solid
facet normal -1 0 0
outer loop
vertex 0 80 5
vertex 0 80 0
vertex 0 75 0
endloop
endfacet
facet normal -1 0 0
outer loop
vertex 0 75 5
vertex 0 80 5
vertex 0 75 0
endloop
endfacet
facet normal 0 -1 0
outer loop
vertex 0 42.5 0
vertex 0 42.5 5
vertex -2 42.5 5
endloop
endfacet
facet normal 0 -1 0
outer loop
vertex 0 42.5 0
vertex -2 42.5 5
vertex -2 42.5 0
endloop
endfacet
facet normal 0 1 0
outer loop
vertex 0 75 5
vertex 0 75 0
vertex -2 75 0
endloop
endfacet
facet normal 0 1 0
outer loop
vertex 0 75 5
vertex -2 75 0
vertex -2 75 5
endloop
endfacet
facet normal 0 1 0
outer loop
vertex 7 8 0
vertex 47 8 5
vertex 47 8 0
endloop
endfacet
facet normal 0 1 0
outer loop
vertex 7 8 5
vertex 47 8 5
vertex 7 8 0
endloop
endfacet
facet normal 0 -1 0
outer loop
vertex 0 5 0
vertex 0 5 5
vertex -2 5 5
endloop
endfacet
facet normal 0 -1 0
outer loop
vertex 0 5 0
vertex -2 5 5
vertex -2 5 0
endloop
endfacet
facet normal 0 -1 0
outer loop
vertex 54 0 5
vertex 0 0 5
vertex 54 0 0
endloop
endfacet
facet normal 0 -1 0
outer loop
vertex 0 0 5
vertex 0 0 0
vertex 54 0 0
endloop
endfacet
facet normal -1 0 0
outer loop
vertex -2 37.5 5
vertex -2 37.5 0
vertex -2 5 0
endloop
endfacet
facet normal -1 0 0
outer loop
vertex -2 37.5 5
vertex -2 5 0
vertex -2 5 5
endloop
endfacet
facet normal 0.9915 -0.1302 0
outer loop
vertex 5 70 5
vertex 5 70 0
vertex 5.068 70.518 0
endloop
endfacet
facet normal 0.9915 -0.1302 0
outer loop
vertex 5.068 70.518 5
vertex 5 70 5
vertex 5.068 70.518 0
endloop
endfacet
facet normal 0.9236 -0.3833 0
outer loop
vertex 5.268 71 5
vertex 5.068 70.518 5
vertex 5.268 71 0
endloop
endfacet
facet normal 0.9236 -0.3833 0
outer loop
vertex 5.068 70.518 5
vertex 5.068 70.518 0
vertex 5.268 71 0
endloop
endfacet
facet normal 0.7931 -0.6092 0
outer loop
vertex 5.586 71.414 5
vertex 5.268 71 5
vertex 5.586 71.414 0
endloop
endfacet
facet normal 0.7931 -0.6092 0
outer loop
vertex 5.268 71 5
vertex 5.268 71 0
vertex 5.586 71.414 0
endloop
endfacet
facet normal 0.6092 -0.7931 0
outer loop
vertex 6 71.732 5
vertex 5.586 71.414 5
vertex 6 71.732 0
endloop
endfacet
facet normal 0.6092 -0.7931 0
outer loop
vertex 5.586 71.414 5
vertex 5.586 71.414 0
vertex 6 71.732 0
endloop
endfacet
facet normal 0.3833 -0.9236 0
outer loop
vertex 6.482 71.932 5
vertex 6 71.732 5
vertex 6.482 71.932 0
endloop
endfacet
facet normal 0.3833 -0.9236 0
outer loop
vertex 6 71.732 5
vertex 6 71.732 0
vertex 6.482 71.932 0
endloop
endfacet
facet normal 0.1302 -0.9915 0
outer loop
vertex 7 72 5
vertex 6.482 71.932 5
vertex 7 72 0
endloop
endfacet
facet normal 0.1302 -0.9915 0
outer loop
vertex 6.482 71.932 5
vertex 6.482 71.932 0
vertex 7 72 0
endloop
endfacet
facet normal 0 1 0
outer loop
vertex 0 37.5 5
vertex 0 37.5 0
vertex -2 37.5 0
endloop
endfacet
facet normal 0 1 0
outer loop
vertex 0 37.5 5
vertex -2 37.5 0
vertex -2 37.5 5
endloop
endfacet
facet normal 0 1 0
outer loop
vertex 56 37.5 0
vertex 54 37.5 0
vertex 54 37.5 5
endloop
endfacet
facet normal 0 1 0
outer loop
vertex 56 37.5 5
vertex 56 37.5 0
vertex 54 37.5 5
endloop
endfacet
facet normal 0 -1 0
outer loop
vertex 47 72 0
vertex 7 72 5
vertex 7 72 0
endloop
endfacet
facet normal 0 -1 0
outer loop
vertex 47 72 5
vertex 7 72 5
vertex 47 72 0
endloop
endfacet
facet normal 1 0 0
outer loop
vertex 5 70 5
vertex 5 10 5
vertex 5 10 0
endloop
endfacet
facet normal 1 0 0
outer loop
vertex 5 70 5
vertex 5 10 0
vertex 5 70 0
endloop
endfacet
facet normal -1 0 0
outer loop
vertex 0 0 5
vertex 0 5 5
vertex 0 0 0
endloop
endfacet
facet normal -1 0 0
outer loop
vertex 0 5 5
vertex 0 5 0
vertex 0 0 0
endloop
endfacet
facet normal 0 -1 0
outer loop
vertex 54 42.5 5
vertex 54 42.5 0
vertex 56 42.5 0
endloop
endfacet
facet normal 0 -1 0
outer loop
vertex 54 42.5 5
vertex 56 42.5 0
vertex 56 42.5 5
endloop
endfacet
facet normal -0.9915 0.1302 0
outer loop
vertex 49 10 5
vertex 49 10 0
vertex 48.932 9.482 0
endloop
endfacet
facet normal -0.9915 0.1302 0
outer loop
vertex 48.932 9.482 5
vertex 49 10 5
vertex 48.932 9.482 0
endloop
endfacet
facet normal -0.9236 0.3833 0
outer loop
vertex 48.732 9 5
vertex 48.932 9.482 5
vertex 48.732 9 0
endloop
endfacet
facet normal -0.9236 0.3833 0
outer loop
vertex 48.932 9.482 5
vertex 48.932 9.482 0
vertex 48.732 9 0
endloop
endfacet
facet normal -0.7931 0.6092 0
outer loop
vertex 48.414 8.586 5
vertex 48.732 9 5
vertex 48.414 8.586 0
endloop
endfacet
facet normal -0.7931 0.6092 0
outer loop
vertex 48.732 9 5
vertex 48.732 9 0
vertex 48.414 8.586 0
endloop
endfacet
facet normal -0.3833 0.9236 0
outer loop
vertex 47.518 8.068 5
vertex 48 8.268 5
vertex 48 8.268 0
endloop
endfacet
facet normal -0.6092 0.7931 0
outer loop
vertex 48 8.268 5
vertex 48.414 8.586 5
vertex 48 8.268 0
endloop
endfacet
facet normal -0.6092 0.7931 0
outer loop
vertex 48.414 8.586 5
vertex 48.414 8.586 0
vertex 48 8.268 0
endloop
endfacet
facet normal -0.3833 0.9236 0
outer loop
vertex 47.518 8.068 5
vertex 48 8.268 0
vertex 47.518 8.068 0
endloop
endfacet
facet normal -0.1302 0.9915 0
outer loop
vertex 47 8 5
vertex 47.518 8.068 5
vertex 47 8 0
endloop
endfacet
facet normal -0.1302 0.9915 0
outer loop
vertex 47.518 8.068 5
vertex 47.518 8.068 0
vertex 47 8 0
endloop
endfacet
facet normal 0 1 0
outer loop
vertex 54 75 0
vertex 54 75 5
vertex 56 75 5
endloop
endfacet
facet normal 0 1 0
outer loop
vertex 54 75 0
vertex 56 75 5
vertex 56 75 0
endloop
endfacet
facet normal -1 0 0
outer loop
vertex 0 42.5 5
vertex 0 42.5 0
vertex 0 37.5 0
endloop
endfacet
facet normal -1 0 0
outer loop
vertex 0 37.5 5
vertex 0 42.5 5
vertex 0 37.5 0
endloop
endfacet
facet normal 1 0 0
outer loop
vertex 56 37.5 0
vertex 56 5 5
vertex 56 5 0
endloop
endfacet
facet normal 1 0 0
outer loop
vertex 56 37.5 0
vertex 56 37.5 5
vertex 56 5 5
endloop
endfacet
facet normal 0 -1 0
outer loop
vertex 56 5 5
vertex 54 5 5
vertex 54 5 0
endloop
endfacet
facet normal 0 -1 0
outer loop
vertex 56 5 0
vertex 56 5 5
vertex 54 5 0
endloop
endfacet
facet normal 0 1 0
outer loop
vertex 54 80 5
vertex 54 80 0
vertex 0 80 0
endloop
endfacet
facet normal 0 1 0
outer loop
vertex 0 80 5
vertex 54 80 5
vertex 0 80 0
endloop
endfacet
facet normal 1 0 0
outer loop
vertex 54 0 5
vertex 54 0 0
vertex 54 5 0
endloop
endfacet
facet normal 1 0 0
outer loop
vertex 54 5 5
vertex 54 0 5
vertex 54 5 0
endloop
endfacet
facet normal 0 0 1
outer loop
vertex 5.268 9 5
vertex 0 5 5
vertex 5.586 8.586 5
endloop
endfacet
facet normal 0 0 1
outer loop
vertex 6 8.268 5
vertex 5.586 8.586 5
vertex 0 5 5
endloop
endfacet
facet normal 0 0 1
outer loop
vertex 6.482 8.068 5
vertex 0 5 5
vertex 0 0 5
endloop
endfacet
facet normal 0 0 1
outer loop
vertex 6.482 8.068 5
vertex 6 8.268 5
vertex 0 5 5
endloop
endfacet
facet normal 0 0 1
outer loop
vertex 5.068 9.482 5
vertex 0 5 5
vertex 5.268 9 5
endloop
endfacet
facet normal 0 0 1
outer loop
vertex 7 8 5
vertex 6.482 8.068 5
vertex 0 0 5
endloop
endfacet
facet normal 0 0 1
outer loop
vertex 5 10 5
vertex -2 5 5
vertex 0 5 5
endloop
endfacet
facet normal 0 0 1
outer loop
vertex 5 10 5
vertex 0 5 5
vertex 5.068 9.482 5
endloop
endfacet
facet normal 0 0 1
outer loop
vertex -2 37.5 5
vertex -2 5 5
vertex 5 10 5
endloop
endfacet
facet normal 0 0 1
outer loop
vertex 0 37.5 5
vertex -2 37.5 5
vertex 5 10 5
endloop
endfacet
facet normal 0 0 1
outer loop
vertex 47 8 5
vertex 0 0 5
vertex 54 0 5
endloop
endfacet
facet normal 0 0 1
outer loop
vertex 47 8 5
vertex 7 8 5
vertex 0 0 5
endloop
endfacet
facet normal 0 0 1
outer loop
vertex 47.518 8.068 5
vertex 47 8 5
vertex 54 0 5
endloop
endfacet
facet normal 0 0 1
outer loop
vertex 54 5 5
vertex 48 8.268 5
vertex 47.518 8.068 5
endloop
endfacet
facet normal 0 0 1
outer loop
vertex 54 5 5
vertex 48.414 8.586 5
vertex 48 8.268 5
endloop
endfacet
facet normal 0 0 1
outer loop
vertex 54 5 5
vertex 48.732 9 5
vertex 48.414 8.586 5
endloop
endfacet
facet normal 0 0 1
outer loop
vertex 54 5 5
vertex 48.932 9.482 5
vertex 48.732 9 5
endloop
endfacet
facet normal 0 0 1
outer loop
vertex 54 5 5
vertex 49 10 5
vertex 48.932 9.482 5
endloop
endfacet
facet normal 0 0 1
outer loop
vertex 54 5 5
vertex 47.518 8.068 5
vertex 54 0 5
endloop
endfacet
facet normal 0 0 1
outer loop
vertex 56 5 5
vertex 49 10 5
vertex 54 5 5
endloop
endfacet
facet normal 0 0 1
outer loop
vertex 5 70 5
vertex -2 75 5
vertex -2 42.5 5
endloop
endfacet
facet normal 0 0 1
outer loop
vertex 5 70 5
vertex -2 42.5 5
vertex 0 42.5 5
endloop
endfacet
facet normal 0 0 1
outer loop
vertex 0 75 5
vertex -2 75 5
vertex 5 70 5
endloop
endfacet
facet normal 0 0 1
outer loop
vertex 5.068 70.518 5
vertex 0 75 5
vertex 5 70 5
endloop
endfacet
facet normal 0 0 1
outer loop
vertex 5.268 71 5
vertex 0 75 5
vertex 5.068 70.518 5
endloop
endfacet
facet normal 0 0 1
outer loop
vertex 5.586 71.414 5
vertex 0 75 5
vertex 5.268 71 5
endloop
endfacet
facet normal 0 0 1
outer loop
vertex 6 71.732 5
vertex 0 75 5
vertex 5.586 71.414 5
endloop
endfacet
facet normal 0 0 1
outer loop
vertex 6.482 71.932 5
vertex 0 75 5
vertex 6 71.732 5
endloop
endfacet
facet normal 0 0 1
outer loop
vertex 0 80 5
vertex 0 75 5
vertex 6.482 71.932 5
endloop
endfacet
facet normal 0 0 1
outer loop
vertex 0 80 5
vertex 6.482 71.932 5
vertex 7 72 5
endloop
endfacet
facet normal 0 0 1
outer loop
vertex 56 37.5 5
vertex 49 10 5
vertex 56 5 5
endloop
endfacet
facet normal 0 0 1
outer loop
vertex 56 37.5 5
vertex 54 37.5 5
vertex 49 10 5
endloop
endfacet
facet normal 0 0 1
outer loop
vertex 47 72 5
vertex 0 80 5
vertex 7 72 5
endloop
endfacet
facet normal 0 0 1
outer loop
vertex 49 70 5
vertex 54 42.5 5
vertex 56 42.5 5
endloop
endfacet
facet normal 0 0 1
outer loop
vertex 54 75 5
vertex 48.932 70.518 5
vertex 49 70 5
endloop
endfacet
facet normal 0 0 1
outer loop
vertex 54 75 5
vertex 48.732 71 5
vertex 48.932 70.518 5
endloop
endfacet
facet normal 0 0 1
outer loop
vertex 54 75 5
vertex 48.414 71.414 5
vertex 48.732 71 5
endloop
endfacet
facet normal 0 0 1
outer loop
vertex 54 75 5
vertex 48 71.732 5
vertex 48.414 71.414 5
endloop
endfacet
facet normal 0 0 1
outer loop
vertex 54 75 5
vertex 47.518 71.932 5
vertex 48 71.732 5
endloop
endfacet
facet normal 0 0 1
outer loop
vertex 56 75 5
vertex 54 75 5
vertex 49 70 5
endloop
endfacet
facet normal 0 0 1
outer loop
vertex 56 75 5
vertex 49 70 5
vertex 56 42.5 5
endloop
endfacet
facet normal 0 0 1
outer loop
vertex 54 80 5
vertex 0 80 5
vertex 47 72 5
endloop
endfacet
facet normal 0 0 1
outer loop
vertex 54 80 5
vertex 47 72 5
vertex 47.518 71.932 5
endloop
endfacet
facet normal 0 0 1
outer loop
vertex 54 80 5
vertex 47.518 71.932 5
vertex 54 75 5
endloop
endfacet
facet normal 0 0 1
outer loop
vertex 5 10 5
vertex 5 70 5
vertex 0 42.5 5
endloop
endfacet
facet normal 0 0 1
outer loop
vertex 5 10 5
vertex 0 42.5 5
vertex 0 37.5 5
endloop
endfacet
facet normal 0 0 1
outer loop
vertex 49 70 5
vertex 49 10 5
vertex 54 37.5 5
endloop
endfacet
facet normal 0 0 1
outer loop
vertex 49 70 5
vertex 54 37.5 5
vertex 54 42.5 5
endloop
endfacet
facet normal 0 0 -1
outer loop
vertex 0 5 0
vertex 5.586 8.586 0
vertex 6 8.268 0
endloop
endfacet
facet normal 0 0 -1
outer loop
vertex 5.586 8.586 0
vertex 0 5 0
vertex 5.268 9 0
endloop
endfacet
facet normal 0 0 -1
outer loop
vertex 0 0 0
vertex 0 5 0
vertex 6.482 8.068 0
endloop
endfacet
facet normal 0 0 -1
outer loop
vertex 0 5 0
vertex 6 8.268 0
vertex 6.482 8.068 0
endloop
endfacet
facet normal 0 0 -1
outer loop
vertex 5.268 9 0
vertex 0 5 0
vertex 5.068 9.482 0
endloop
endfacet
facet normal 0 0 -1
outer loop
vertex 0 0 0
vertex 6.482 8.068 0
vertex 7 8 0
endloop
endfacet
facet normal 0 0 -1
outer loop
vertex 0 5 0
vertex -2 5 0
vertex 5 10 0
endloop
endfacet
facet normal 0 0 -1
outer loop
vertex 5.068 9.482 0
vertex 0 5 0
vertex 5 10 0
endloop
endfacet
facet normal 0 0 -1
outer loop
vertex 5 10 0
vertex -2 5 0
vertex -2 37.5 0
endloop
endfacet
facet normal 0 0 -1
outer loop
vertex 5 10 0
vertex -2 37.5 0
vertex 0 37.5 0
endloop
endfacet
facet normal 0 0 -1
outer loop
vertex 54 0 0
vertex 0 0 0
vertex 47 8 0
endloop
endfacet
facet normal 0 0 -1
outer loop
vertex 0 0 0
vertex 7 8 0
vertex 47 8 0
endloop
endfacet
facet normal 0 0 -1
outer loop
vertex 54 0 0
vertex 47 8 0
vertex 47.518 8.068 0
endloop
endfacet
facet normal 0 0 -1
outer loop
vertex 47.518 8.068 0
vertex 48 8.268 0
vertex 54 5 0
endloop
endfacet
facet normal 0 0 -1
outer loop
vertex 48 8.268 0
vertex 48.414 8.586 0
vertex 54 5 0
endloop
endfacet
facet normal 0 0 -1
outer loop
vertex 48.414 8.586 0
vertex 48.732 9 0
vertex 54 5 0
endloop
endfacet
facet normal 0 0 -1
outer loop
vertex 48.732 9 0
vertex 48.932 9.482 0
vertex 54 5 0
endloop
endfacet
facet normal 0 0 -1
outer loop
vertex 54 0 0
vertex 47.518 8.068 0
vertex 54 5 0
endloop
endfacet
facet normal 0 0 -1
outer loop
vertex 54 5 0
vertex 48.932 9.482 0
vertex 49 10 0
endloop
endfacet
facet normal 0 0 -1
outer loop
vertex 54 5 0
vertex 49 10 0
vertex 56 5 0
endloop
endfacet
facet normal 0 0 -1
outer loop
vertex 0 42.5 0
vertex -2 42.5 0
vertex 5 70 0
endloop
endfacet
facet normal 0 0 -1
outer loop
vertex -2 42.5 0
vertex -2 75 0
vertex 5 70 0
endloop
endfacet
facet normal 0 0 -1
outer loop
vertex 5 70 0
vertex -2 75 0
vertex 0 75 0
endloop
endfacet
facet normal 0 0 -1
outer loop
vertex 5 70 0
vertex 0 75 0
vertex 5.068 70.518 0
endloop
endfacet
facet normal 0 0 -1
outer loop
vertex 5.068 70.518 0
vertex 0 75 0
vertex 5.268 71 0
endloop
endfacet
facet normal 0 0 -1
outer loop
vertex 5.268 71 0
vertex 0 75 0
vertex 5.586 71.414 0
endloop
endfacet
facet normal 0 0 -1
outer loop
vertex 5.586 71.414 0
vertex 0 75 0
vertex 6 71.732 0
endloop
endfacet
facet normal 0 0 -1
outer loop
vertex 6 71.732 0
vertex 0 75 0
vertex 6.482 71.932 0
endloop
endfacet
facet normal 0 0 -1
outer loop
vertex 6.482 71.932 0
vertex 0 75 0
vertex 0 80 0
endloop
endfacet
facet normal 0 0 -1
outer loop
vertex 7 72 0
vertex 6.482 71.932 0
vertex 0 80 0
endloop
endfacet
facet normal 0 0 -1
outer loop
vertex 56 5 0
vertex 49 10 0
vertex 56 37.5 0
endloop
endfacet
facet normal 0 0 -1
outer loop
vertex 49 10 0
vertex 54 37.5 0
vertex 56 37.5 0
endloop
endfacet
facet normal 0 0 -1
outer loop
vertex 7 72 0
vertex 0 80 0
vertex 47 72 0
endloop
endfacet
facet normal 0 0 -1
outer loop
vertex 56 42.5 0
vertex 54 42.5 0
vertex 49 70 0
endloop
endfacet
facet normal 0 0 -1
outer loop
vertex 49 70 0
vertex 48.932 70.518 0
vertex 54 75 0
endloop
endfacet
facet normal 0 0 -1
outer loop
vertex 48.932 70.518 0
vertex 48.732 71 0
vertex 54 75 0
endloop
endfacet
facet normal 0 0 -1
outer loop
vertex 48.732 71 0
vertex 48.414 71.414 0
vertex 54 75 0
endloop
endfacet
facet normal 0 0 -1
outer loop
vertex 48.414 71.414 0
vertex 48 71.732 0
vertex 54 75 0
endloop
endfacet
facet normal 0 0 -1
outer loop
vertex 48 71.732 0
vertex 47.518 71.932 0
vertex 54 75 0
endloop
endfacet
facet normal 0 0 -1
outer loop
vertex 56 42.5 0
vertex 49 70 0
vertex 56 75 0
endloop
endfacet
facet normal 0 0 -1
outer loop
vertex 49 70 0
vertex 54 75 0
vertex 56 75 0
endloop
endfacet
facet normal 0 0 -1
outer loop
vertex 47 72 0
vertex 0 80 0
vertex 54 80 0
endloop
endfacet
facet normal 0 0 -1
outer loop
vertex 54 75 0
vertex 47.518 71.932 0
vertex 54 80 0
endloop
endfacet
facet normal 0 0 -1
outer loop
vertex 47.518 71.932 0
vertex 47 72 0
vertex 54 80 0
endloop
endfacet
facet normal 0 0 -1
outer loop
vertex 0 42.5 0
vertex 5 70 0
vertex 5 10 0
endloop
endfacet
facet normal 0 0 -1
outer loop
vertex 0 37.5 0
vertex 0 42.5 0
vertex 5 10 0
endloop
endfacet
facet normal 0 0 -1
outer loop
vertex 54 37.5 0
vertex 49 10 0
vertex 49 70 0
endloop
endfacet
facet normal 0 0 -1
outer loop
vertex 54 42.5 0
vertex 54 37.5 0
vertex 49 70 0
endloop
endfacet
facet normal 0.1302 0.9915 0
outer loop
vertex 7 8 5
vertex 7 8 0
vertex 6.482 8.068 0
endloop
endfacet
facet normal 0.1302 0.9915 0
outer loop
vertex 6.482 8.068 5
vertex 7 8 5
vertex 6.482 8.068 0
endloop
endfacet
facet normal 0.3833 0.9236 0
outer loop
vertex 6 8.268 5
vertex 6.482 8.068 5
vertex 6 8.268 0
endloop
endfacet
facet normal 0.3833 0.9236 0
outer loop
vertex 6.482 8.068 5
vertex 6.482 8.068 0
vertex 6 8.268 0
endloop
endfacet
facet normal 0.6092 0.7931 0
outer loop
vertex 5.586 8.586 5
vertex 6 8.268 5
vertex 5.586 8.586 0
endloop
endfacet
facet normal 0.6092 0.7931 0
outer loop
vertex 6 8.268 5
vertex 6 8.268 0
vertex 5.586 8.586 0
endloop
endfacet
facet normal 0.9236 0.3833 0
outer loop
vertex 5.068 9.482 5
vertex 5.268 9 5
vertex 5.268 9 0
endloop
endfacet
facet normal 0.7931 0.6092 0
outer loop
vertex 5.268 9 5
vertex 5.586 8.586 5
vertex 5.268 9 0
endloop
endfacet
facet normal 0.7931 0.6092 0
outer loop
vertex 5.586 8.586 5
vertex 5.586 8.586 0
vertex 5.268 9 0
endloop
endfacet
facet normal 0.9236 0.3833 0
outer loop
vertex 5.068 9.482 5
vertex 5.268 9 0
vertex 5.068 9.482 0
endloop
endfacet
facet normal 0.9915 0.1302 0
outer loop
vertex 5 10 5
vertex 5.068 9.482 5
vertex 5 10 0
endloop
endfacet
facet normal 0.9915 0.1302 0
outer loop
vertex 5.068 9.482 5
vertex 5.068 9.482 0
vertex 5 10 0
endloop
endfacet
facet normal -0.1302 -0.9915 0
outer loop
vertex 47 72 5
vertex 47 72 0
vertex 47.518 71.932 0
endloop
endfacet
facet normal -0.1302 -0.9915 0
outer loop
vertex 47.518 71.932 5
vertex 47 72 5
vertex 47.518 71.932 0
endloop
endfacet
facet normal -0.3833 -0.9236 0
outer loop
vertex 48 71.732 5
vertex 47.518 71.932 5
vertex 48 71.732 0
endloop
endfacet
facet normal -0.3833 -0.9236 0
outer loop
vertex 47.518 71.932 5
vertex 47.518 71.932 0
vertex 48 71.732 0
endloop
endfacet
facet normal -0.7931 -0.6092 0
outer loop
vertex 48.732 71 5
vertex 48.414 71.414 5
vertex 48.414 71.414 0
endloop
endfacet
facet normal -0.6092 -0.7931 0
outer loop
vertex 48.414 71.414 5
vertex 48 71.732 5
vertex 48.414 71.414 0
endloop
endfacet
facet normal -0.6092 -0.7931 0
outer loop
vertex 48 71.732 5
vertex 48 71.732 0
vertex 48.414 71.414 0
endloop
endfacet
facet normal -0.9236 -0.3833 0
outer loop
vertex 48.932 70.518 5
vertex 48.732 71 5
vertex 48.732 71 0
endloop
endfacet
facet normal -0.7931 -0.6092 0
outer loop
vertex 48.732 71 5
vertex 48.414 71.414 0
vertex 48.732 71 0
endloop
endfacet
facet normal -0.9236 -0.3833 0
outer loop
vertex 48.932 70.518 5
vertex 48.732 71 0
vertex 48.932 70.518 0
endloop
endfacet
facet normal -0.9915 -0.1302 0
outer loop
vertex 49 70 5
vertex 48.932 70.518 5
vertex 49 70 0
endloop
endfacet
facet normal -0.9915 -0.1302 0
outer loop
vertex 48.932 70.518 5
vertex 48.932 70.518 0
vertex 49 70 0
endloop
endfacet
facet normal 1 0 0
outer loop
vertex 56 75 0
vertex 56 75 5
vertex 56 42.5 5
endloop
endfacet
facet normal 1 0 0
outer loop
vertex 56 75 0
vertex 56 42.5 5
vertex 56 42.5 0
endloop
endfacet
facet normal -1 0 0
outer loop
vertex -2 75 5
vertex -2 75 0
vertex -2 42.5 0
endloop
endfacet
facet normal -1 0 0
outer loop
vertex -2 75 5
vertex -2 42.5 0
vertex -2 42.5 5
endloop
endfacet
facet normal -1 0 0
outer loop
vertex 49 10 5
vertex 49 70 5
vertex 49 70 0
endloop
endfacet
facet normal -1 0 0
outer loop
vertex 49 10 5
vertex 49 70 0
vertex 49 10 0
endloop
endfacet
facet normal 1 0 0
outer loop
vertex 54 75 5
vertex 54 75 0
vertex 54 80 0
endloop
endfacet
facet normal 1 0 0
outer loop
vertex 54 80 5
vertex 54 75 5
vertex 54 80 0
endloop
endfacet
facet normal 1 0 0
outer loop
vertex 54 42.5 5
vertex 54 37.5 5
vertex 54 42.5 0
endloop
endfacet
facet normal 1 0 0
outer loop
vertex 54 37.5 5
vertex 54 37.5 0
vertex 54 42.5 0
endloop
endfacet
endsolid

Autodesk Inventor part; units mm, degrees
ref_plane "YZ Plane" through (0, 0, 0) normal (1, 0, 0) x (0, 1, 0)
ref_plane "XZ Plane" through (0, 0, 0) normal (0, 1, 0) x (-1, 0, 0)
ref_plane "XY Plane" through (0, 0, 0) normal (0, 0, 1) x (1, 0, 0)
sketch "スケッチ1" plane through (0, 0, 0) normal (0, 0, 1) x (1, 0, 0)
  line L0 (0, 0) -> (54, 0)
  line L1 (54, 0) -> (54, 80)
  line L2 (54, 80) -> (0, 80)
  line L3 (0, 80) -> (0, 0)
  dimension "d0" = 54
  dimension "d1" = 80
extrude "押し出し1" add sketch "スケッチ1" along normal blind 5
sketch "スケッチ2" plane through (54, 0, 0) normal (1, 0, 0) x (0, 0, -1)
  line L0 (0, 0) -> (0, 80) projected
  line L1 (0, 80) -> (-5, 80) projected
  line L2 (-5, 0) -> (-5, 80) projected
  line L3 (0, 0) -> (-5, 0) projected
  line L4 (-5, 0) -> (-5, 80) projected
  line L5 (-5, 40) -> (0, 40) construction
  line L6 (0, 0) -> (0, 80) projected
  line L7 (-5, 75) -> (0, 75)
  line L8 (0, 75) -> (0, 42.5)
  line L9 (0, 42.5) -> (-5, 42.5)
  line L10 (-5, 42.5) -> (-5, 75)
  line L11 (-5, 5) -> (0, 5)
  line L12 (0, 5) -> (0, 37.5)
  line L13 (0, 37.5) -> (-5, 37.5)
  line L14 (-5, 37.5) -> (-5, 5)
  point P0 (0, 37.5)
  point P1 (-5, 37.5)
  point P2 (0, 5)
  point P3 (-5, 42.5)
  point P4 (0, 42.5)
  point P5 (0, 75)
  dimension "d4" = 5
  dimension "d5" = 5
extrude "押し出し2" add sketch "スケッチ2" along normal blind 2 contours L11 L2 L13 L0 | L9 L2 L7 L0
sketch "スケッチ3" plane through (0, 0, 0) normal (-1, 0, 0) x (0, 0, 1)
  line L0 (0, 42.5) -> (0, 75) projected
  line L1 (0, 75) -> (5, 75) projected
  line L2 (5, 75) -> (5, 42.5) projected
  line L3 (5, 42.5) -> (0, 42.5) projected
  line L4 (5, 37.5) -> (5, 5) projected
  line L5 (5, 5) -> (0, 5) projected
  line L6 (0, 5) -> (0, 37.5) projected
  line L7 (0, 37.5) -> (5, 37.5) projected
  point P0 (0, 0)
extrude "押し出し3" add sketch "スケッチ3" along normal blind 2
sketch "スケッチ4" plane through (0, 0, 5) normal (0, 0, 1) x (1, 0, 0)
  line L0 (54, 0) -> (54, 5) projected
  line L1 (54, 5) -> (56, 5) projected
  line L2 (56, 37.5) -> (56, 5) projected
  line L3 (54, 37.5) -> (56, 37.5) projected
  line L4 (54, 37.5) -> (54, 42.5) projected
  line L5 (54, 42.5) -> (56, 42.5) projected
  line L6 (56, 75) -> (56, 42.5) projected
  line L7 (54, 75) -> (56, 75) projected
  line L8 (54, 75) -> (54, 80) projected
  line L9 (54, 80) -> (0, 80) projected
  line L10 (0, 80) -> (0, 75) projected
  line L11 (0, 75) -> (-2, 75) projected
  line L12 (-2, 42.5) -> (-2, 75) projected
  line L13 (0, 42.5) -> (-2, 42.5) projected
  line L14 (0, 42.5) -> (0, 37.5) projected
  line L15 (0, 37.5) -> (-2, 37.5) projected
  line L16 (-2, 5) -> (-2, 37.5) projected
  line L17 (0, 5) -> (-2, 5) projected
  line L18 (0, 5) -> (0, 0) projected
  line L19 (0, 0) -> (54, 0) projected
  line L20 (54, 80) -> (0, 80) projected
  line L21 (27, 80) -> (27, 0) construction
  line L22 (0, 0) -> (54, 0) projected
  line L23 (5, 72) -> (49, 72)
  line L24 (49, 72) -> (49, 8)
  line L25 (49, 8) -> (5, 8)
  line L26 (5, 8) -> (5, 72)
  line L27 (0, 42.5) -> (0, 37.5) projected
  line L28 (0, 40) -> (54, 40) construction
  dimension "d10" = 8
  dimension "d11" = 5
extrude "押し出し4" cut sketch "スケッチ4" against normal through all contours L23 L24 L25 L26
fillet "フィレット1" radius 2 4 edges at (49, 72, 2.5) (5, 72, 2.5) (5, 8, 2.5) (49, 8, 2.5)
properties part number "foot_connect"
